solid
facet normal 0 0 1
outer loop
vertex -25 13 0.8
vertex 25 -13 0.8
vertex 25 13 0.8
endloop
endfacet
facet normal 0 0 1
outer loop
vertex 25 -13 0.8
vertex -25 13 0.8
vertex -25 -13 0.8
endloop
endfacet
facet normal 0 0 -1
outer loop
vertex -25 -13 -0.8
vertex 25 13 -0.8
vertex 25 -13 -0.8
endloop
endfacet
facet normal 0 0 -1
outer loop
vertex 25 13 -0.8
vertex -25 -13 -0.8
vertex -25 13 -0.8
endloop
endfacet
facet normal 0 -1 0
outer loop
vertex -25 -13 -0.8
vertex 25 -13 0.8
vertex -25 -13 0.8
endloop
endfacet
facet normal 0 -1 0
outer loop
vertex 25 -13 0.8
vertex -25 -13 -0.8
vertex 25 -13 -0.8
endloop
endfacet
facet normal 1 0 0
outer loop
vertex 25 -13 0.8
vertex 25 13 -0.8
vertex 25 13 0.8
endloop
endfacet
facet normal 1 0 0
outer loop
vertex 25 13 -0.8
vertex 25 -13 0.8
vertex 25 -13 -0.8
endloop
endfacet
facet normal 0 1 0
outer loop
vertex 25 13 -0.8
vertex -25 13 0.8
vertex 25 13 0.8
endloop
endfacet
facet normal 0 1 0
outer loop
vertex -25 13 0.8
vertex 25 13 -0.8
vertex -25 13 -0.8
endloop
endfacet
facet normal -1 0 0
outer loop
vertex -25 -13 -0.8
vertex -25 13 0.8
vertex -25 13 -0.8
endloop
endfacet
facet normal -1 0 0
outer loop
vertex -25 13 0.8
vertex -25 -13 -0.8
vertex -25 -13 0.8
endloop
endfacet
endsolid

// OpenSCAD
// Parameters
length = 50; //[25:100:0.5]
width = 26; //[13:52:0.5]
thickness = 1.6; //[0.8:3.2:0.1]
corner_radius = 0; //[0:5:0.25]

// PCB Plate - Simple relay module PCB
module pcb_plate() {
  color([0.0, 0.4, 0.2]) { // Green color for PCB
    cube([length, width, thickness], center=true);
  }
}

// Assembly
module assembly() {
  pcb_plate();
}

assembly();
